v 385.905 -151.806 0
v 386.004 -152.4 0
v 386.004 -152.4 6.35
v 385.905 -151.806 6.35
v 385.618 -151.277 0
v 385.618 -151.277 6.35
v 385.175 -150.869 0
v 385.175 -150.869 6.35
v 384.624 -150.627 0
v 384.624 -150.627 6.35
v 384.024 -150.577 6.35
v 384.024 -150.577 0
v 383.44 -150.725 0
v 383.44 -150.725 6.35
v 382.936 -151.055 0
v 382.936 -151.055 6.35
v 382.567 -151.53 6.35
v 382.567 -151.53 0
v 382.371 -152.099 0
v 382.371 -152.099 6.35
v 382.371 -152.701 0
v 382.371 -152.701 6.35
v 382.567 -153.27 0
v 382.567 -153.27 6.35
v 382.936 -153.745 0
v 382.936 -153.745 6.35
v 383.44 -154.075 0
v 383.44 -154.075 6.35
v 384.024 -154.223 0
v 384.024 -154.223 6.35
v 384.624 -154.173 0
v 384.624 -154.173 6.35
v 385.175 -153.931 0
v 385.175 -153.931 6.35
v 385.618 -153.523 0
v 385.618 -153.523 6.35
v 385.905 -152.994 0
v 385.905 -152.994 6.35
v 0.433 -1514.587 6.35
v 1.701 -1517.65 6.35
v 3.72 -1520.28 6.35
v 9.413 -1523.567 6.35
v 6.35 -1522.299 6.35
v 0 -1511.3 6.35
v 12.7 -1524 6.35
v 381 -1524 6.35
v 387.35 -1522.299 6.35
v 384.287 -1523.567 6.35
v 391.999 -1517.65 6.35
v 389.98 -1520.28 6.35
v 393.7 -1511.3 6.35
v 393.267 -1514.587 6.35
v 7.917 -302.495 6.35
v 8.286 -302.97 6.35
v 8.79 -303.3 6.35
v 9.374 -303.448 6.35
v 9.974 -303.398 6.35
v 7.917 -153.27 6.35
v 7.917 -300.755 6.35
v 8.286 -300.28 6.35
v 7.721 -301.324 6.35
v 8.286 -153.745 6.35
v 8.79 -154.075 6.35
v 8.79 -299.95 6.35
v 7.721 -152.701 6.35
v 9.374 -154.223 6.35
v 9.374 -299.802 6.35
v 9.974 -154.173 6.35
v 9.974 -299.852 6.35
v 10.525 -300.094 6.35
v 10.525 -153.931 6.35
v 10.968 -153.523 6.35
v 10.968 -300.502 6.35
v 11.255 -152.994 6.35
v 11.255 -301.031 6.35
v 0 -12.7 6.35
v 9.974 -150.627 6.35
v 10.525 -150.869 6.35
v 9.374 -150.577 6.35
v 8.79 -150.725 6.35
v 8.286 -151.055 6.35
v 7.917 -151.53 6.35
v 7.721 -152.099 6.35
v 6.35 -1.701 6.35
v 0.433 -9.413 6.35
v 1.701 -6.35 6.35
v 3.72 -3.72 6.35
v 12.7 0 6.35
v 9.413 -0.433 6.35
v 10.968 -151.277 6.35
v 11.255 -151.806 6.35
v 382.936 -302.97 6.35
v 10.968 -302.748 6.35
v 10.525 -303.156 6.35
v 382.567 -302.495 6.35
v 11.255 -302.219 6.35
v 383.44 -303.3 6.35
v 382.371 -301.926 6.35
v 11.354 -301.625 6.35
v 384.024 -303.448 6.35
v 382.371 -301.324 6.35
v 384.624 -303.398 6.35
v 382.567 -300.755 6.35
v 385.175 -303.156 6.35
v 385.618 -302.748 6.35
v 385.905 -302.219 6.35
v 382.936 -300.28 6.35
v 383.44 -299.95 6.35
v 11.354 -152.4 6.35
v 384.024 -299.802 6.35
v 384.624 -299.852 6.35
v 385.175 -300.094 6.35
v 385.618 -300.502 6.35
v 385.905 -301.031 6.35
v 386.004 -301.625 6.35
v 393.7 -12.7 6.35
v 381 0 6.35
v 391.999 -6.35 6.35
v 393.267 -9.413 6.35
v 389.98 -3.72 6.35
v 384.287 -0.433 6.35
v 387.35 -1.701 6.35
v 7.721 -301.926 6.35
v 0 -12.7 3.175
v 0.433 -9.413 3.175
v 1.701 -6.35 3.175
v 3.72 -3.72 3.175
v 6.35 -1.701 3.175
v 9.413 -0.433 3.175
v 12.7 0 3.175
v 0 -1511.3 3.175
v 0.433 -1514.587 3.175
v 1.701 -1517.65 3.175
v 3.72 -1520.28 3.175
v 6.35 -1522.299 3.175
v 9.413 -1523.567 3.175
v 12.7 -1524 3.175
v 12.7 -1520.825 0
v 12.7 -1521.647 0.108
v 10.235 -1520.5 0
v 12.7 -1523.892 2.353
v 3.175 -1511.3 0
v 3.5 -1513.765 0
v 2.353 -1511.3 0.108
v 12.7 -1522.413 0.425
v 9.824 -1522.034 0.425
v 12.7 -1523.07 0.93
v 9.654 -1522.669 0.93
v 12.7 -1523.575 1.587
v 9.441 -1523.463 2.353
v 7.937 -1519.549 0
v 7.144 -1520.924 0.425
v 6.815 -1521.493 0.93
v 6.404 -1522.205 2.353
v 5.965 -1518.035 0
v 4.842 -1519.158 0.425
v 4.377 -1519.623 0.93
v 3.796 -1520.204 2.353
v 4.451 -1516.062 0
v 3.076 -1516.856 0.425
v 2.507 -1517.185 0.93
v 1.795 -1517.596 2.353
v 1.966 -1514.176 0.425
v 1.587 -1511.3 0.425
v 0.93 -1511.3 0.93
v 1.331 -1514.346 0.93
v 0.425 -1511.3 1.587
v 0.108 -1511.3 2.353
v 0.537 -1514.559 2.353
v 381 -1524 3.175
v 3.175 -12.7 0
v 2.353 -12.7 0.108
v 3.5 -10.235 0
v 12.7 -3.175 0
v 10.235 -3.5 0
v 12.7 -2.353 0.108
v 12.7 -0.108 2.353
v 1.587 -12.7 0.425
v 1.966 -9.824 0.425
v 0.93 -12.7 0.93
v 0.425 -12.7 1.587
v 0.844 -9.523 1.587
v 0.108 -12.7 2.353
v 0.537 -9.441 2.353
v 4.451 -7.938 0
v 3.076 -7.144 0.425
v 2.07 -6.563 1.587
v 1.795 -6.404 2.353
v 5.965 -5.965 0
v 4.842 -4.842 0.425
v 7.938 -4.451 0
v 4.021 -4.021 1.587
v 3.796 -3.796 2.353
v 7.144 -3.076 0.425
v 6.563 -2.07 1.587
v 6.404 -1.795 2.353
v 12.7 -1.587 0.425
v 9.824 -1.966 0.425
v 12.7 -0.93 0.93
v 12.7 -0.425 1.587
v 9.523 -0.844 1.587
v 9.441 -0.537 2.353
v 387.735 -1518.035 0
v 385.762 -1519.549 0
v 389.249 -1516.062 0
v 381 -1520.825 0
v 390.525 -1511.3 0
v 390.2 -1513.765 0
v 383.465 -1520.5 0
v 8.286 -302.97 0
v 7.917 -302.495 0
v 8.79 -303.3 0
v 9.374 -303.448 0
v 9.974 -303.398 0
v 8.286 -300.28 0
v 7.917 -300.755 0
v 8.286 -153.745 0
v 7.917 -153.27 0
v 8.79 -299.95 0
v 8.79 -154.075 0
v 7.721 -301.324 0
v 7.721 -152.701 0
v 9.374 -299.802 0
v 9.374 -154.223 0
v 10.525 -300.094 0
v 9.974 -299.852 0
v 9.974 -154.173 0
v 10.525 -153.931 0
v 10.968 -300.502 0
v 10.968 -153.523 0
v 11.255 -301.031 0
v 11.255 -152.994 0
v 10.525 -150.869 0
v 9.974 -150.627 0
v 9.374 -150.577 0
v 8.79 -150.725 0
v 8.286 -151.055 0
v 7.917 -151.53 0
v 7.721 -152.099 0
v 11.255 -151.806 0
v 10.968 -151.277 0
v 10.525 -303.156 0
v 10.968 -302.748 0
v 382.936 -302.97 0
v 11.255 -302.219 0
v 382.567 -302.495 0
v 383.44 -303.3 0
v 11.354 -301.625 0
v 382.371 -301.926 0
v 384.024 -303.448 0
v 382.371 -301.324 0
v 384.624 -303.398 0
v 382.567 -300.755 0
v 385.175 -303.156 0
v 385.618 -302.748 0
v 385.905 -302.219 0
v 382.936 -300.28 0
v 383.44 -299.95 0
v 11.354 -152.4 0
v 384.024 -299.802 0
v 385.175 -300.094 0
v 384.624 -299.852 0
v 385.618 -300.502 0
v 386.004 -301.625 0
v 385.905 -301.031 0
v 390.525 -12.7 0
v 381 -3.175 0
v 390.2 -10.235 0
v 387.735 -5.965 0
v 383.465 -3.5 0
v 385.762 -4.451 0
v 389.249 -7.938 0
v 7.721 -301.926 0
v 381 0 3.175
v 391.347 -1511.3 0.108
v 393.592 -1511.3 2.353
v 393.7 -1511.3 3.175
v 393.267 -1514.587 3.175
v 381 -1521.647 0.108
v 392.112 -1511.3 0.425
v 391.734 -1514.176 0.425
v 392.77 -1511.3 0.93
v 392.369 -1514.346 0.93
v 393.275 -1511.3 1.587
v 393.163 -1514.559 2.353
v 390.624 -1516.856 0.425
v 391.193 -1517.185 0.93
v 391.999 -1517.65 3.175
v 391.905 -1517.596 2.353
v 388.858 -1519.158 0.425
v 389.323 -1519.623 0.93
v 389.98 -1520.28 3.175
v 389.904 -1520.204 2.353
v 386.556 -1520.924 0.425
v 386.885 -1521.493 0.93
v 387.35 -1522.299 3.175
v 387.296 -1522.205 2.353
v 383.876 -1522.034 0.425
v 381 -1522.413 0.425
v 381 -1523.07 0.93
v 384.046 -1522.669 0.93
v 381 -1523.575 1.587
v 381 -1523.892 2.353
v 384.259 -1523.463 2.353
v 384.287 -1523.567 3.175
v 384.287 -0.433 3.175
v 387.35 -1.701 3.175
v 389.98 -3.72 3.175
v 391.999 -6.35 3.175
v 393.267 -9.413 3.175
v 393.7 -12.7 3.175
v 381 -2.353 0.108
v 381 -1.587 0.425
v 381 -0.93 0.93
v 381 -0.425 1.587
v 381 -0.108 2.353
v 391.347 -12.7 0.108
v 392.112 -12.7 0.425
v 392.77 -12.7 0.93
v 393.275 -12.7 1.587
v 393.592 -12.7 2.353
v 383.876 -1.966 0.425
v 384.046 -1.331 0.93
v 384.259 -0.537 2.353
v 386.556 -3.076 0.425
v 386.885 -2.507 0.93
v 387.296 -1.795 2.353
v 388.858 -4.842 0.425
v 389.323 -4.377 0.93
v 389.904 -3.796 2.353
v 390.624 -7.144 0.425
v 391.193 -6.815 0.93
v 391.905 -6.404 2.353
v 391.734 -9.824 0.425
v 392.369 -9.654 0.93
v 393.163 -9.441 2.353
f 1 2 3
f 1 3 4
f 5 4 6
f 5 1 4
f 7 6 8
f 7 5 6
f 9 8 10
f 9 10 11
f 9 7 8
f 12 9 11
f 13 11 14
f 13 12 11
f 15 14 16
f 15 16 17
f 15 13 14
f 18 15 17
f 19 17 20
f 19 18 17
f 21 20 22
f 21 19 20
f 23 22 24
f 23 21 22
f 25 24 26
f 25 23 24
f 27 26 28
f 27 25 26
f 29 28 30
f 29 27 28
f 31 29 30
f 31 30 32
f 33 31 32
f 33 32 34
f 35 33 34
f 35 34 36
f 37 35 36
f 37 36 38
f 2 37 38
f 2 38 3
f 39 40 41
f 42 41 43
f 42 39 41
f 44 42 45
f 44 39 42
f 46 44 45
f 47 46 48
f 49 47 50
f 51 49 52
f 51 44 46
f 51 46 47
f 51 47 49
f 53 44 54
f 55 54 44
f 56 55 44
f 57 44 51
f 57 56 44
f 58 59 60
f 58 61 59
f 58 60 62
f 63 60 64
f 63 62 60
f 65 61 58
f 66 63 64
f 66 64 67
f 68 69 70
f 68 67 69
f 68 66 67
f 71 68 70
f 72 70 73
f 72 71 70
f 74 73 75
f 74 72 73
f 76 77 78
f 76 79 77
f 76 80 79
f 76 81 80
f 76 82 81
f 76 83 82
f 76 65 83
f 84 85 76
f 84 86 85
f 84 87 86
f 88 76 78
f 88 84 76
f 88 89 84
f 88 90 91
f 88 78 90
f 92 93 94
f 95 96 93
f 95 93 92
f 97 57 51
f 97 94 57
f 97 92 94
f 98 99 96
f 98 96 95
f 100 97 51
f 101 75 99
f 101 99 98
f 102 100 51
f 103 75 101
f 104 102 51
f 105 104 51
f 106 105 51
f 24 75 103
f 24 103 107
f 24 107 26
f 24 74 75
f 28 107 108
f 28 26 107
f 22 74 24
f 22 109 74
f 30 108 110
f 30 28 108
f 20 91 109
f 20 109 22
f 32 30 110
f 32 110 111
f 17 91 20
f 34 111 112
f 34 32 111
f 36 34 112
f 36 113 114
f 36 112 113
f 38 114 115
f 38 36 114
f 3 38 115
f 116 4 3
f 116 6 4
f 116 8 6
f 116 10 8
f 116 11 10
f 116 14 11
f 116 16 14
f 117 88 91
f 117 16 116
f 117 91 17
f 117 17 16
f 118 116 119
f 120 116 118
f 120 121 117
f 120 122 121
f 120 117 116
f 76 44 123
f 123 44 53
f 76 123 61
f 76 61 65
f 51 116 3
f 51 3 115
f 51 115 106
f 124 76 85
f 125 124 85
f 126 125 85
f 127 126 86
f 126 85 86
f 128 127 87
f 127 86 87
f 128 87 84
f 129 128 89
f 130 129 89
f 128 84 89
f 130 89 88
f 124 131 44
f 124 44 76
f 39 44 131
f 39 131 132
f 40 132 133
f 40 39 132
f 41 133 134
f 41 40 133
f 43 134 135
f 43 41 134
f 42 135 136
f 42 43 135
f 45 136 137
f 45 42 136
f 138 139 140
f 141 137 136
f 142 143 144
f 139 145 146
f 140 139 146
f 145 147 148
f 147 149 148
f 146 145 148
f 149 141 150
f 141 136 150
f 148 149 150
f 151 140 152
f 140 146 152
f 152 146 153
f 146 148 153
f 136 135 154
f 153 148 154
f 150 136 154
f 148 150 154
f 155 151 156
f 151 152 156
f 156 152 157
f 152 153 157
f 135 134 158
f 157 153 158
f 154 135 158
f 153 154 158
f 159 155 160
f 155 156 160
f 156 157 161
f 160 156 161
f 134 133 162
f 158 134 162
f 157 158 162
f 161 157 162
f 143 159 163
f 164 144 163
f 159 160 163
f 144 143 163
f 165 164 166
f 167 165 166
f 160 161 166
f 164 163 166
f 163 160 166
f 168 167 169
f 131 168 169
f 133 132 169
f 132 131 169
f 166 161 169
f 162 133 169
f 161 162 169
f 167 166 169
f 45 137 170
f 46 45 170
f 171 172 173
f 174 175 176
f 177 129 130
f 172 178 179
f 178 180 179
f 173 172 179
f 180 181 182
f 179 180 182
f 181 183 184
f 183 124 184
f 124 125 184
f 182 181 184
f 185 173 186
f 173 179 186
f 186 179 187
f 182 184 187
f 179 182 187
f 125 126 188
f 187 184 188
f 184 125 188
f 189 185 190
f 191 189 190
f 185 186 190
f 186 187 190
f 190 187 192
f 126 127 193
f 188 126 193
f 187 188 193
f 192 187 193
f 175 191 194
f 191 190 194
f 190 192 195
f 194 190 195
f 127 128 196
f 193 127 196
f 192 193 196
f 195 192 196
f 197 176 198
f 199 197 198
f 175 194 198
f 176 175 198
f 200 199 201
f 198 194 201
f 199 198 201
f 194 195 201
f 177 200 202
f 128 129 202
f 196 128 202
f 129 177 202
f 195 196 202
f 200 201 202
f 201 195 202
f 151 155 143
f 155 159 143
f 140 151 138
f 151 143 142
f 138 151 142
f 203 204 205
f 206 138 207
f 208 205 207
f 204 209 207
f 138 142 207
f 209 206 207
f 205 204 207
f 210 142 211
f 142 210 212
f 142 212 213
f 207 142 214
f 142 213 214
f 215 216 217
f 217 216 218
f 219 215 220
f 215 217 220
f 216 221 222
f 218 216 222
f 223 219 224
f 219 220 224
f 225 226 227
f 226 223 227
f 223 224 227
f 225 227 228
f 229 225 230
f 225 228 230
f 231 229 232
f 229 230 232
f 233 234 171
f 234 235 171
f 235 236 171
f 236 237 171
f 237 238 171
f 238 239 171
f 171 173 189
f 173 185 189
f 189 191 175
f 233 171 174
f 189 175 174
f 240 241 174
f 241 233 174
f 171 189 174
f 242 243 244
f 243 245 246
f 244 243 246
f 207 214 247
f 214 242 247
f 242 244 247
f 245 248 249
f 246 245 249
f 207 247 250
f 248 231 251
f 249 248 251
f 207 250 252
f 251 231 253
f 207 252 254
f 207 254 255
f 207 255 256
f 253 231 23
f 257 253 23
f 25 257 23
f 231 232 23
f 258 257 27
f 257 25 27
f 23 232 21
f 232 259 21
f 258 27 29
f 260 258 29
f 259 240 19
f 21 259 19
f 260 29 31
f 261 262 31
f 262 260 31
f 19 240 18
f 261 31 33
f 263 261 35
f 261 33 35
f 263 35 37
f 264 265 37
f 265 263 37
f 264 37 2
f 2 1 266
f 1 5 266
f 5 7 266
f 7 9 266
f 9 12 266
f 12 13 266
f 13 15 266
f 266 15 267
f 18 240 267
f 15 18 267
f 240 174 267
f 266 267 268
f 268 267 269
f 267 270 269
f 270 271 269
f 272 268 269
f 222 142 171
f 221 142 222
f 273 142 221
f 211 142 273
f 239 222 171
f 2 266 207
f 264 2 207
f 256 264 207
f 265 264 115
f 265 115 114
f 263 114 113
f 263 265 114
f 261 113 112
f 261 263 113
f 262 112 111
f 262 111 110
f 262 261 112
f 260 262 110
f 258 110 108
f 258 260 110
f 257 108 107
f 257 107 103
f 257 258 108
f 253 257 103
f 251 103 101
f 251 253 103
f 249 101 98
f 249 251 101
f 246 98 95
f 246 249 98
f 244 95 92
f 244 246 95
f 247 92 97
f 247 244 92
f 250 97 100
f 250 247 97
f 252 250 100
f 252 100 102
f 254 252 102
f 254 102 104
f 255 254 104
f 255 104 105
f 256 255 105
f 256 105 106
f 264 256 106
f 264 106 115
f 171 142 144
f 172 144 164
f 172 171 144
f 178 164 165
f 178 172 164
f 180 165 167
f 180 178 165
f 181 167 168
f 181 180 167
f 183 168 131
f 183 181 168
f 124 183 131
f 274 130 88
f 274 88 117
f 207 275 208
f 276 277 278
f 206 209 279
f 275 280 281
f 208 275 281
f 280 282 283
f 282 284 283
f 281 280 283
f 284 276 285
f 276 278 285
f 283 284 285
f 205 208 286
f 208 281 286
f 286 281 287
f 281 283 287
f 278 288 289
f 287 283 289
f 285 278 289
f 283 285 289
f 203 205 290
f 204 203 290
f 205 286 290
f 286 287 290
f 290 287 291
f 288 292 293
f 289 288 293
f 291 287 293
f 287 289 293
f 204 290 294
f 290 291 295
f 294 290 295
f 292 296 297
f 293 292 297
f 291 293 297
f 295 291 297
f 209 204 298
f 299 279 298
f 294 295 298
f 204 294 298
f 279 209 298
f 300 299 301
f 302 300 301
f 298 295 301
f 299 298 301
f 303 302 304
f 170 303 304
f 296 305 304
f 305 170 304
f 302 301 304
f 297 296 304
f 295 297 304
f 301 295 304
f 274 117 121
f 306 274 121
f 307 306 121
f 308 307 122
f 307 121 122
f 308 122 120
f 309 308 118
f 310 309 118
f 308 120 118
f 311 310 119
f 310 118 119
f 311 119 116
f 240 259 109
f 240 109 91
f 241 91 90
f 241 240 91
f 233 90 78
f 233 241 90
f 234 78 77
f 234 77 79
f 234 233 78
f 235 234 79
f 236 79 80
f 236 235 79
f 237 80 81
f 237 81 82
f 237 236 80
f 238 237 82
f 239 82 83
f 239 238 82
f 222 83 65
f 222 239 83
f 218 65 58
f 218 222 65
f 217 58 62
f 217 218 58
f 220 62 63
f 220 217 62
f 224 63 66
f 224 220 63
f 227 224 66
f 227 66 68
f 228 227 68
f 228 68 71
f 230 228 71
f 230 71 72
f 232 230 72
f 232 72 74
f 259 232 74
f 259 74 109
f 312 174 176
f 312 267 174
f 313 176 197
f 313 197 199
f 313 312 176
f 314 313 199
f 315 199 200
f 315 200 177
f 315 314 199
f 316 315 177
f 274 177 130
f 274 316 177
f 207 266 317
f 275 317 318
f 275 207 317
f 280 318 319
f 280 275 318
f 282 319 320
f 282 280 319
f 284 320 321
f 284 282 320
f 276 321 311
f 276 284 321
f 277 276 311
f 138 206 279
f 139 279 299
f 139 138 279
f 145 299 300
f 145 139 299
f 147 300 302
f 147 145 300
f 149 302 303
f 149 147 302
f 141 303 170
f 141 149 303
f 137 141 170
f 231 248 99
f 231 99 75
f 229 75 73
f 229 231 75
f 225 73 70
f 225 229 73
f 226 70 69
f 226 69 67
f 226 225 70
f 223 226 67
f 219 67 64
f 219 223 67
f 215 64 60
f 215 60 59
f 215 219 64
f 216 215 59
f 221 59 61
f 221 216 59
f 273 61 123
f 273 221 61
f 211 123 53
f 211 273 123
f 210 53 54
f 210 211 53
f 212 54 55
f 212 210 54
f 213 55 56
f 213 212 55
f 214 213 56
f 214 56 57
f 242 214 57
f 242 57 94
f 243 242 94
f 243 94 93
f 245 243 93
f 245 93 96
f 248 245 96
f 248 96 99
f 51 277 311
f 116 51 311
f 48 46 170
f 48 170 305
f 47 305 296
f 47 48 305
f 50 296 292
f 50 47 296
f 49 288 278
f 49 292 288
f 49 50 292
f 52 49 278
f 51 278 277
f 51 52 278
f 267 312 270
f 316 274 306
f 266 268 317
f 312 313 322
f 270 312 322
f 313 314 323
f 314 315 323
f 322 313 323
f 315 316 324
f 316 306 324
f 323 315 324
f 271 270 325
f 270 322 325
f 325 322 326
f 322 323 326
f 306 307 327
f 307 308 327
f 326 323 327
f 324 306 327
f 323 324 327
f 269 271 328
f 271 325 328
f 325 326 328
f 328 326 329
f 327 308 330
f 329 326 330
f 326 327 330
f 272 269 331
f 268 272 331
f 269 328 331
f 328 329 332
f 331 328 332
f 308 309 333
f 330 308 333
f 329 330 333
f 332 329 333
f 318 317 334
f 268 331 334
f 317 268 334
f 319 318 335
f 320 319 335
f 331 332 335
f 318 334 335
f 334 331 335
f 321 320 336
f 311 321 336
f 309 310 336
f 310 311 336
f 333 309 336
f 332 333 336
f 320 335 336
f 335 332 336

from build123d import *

# Parameters (mm, degrees)
F0_W     = 393.7
F0_H     = 1524
F0_R     = 1.8288
F1_DEPTH = 6.35
F2_R     = 12.7
F3_R     = 3.175


with BuildPart() as f1:
    # F0 (on Top) → F1 (new body)
    with BuildSketch(Plane.XY):
        with Locations((196.85, -762)):
            Rectangle(F0_W, F0_H)
        with Locations((9.525, -301.625)):
            Circle(F0_R, mode=Mode.SUBTRACT)
        with Locations((9.525, -152.4)):
            Circle(F0_R, mode=Mode.SUBTRACT)
        with Locations((384.175, -301.625)):
            Circle(F0_R, mode=Mode.SUBTRACT)
        with Locations((384.175, -152.4)):
            Circle(F0_R, mode=Mode.SUBTRACT)
    extrude(amount=F1_DEPTH)

    # F2
    f2_edges = [f1.edges().sort_by_distance(p)[0] for p in [
        (393.7, -1524, 3.175),
        (0, -1524, 3.175),
        (393.7, 0, 3.175),
        (0, 0, 3.175),
    ]]
    fillet(f2_edges, radius=F2_R)

    # F3
    f3_edges = [f1.edges().sort_by_distance(p)[0] for p in [
        (196.85, 0, 0),
    ]]
    fillet(f3_edges, radius=F3_R)


solid = f1.part
